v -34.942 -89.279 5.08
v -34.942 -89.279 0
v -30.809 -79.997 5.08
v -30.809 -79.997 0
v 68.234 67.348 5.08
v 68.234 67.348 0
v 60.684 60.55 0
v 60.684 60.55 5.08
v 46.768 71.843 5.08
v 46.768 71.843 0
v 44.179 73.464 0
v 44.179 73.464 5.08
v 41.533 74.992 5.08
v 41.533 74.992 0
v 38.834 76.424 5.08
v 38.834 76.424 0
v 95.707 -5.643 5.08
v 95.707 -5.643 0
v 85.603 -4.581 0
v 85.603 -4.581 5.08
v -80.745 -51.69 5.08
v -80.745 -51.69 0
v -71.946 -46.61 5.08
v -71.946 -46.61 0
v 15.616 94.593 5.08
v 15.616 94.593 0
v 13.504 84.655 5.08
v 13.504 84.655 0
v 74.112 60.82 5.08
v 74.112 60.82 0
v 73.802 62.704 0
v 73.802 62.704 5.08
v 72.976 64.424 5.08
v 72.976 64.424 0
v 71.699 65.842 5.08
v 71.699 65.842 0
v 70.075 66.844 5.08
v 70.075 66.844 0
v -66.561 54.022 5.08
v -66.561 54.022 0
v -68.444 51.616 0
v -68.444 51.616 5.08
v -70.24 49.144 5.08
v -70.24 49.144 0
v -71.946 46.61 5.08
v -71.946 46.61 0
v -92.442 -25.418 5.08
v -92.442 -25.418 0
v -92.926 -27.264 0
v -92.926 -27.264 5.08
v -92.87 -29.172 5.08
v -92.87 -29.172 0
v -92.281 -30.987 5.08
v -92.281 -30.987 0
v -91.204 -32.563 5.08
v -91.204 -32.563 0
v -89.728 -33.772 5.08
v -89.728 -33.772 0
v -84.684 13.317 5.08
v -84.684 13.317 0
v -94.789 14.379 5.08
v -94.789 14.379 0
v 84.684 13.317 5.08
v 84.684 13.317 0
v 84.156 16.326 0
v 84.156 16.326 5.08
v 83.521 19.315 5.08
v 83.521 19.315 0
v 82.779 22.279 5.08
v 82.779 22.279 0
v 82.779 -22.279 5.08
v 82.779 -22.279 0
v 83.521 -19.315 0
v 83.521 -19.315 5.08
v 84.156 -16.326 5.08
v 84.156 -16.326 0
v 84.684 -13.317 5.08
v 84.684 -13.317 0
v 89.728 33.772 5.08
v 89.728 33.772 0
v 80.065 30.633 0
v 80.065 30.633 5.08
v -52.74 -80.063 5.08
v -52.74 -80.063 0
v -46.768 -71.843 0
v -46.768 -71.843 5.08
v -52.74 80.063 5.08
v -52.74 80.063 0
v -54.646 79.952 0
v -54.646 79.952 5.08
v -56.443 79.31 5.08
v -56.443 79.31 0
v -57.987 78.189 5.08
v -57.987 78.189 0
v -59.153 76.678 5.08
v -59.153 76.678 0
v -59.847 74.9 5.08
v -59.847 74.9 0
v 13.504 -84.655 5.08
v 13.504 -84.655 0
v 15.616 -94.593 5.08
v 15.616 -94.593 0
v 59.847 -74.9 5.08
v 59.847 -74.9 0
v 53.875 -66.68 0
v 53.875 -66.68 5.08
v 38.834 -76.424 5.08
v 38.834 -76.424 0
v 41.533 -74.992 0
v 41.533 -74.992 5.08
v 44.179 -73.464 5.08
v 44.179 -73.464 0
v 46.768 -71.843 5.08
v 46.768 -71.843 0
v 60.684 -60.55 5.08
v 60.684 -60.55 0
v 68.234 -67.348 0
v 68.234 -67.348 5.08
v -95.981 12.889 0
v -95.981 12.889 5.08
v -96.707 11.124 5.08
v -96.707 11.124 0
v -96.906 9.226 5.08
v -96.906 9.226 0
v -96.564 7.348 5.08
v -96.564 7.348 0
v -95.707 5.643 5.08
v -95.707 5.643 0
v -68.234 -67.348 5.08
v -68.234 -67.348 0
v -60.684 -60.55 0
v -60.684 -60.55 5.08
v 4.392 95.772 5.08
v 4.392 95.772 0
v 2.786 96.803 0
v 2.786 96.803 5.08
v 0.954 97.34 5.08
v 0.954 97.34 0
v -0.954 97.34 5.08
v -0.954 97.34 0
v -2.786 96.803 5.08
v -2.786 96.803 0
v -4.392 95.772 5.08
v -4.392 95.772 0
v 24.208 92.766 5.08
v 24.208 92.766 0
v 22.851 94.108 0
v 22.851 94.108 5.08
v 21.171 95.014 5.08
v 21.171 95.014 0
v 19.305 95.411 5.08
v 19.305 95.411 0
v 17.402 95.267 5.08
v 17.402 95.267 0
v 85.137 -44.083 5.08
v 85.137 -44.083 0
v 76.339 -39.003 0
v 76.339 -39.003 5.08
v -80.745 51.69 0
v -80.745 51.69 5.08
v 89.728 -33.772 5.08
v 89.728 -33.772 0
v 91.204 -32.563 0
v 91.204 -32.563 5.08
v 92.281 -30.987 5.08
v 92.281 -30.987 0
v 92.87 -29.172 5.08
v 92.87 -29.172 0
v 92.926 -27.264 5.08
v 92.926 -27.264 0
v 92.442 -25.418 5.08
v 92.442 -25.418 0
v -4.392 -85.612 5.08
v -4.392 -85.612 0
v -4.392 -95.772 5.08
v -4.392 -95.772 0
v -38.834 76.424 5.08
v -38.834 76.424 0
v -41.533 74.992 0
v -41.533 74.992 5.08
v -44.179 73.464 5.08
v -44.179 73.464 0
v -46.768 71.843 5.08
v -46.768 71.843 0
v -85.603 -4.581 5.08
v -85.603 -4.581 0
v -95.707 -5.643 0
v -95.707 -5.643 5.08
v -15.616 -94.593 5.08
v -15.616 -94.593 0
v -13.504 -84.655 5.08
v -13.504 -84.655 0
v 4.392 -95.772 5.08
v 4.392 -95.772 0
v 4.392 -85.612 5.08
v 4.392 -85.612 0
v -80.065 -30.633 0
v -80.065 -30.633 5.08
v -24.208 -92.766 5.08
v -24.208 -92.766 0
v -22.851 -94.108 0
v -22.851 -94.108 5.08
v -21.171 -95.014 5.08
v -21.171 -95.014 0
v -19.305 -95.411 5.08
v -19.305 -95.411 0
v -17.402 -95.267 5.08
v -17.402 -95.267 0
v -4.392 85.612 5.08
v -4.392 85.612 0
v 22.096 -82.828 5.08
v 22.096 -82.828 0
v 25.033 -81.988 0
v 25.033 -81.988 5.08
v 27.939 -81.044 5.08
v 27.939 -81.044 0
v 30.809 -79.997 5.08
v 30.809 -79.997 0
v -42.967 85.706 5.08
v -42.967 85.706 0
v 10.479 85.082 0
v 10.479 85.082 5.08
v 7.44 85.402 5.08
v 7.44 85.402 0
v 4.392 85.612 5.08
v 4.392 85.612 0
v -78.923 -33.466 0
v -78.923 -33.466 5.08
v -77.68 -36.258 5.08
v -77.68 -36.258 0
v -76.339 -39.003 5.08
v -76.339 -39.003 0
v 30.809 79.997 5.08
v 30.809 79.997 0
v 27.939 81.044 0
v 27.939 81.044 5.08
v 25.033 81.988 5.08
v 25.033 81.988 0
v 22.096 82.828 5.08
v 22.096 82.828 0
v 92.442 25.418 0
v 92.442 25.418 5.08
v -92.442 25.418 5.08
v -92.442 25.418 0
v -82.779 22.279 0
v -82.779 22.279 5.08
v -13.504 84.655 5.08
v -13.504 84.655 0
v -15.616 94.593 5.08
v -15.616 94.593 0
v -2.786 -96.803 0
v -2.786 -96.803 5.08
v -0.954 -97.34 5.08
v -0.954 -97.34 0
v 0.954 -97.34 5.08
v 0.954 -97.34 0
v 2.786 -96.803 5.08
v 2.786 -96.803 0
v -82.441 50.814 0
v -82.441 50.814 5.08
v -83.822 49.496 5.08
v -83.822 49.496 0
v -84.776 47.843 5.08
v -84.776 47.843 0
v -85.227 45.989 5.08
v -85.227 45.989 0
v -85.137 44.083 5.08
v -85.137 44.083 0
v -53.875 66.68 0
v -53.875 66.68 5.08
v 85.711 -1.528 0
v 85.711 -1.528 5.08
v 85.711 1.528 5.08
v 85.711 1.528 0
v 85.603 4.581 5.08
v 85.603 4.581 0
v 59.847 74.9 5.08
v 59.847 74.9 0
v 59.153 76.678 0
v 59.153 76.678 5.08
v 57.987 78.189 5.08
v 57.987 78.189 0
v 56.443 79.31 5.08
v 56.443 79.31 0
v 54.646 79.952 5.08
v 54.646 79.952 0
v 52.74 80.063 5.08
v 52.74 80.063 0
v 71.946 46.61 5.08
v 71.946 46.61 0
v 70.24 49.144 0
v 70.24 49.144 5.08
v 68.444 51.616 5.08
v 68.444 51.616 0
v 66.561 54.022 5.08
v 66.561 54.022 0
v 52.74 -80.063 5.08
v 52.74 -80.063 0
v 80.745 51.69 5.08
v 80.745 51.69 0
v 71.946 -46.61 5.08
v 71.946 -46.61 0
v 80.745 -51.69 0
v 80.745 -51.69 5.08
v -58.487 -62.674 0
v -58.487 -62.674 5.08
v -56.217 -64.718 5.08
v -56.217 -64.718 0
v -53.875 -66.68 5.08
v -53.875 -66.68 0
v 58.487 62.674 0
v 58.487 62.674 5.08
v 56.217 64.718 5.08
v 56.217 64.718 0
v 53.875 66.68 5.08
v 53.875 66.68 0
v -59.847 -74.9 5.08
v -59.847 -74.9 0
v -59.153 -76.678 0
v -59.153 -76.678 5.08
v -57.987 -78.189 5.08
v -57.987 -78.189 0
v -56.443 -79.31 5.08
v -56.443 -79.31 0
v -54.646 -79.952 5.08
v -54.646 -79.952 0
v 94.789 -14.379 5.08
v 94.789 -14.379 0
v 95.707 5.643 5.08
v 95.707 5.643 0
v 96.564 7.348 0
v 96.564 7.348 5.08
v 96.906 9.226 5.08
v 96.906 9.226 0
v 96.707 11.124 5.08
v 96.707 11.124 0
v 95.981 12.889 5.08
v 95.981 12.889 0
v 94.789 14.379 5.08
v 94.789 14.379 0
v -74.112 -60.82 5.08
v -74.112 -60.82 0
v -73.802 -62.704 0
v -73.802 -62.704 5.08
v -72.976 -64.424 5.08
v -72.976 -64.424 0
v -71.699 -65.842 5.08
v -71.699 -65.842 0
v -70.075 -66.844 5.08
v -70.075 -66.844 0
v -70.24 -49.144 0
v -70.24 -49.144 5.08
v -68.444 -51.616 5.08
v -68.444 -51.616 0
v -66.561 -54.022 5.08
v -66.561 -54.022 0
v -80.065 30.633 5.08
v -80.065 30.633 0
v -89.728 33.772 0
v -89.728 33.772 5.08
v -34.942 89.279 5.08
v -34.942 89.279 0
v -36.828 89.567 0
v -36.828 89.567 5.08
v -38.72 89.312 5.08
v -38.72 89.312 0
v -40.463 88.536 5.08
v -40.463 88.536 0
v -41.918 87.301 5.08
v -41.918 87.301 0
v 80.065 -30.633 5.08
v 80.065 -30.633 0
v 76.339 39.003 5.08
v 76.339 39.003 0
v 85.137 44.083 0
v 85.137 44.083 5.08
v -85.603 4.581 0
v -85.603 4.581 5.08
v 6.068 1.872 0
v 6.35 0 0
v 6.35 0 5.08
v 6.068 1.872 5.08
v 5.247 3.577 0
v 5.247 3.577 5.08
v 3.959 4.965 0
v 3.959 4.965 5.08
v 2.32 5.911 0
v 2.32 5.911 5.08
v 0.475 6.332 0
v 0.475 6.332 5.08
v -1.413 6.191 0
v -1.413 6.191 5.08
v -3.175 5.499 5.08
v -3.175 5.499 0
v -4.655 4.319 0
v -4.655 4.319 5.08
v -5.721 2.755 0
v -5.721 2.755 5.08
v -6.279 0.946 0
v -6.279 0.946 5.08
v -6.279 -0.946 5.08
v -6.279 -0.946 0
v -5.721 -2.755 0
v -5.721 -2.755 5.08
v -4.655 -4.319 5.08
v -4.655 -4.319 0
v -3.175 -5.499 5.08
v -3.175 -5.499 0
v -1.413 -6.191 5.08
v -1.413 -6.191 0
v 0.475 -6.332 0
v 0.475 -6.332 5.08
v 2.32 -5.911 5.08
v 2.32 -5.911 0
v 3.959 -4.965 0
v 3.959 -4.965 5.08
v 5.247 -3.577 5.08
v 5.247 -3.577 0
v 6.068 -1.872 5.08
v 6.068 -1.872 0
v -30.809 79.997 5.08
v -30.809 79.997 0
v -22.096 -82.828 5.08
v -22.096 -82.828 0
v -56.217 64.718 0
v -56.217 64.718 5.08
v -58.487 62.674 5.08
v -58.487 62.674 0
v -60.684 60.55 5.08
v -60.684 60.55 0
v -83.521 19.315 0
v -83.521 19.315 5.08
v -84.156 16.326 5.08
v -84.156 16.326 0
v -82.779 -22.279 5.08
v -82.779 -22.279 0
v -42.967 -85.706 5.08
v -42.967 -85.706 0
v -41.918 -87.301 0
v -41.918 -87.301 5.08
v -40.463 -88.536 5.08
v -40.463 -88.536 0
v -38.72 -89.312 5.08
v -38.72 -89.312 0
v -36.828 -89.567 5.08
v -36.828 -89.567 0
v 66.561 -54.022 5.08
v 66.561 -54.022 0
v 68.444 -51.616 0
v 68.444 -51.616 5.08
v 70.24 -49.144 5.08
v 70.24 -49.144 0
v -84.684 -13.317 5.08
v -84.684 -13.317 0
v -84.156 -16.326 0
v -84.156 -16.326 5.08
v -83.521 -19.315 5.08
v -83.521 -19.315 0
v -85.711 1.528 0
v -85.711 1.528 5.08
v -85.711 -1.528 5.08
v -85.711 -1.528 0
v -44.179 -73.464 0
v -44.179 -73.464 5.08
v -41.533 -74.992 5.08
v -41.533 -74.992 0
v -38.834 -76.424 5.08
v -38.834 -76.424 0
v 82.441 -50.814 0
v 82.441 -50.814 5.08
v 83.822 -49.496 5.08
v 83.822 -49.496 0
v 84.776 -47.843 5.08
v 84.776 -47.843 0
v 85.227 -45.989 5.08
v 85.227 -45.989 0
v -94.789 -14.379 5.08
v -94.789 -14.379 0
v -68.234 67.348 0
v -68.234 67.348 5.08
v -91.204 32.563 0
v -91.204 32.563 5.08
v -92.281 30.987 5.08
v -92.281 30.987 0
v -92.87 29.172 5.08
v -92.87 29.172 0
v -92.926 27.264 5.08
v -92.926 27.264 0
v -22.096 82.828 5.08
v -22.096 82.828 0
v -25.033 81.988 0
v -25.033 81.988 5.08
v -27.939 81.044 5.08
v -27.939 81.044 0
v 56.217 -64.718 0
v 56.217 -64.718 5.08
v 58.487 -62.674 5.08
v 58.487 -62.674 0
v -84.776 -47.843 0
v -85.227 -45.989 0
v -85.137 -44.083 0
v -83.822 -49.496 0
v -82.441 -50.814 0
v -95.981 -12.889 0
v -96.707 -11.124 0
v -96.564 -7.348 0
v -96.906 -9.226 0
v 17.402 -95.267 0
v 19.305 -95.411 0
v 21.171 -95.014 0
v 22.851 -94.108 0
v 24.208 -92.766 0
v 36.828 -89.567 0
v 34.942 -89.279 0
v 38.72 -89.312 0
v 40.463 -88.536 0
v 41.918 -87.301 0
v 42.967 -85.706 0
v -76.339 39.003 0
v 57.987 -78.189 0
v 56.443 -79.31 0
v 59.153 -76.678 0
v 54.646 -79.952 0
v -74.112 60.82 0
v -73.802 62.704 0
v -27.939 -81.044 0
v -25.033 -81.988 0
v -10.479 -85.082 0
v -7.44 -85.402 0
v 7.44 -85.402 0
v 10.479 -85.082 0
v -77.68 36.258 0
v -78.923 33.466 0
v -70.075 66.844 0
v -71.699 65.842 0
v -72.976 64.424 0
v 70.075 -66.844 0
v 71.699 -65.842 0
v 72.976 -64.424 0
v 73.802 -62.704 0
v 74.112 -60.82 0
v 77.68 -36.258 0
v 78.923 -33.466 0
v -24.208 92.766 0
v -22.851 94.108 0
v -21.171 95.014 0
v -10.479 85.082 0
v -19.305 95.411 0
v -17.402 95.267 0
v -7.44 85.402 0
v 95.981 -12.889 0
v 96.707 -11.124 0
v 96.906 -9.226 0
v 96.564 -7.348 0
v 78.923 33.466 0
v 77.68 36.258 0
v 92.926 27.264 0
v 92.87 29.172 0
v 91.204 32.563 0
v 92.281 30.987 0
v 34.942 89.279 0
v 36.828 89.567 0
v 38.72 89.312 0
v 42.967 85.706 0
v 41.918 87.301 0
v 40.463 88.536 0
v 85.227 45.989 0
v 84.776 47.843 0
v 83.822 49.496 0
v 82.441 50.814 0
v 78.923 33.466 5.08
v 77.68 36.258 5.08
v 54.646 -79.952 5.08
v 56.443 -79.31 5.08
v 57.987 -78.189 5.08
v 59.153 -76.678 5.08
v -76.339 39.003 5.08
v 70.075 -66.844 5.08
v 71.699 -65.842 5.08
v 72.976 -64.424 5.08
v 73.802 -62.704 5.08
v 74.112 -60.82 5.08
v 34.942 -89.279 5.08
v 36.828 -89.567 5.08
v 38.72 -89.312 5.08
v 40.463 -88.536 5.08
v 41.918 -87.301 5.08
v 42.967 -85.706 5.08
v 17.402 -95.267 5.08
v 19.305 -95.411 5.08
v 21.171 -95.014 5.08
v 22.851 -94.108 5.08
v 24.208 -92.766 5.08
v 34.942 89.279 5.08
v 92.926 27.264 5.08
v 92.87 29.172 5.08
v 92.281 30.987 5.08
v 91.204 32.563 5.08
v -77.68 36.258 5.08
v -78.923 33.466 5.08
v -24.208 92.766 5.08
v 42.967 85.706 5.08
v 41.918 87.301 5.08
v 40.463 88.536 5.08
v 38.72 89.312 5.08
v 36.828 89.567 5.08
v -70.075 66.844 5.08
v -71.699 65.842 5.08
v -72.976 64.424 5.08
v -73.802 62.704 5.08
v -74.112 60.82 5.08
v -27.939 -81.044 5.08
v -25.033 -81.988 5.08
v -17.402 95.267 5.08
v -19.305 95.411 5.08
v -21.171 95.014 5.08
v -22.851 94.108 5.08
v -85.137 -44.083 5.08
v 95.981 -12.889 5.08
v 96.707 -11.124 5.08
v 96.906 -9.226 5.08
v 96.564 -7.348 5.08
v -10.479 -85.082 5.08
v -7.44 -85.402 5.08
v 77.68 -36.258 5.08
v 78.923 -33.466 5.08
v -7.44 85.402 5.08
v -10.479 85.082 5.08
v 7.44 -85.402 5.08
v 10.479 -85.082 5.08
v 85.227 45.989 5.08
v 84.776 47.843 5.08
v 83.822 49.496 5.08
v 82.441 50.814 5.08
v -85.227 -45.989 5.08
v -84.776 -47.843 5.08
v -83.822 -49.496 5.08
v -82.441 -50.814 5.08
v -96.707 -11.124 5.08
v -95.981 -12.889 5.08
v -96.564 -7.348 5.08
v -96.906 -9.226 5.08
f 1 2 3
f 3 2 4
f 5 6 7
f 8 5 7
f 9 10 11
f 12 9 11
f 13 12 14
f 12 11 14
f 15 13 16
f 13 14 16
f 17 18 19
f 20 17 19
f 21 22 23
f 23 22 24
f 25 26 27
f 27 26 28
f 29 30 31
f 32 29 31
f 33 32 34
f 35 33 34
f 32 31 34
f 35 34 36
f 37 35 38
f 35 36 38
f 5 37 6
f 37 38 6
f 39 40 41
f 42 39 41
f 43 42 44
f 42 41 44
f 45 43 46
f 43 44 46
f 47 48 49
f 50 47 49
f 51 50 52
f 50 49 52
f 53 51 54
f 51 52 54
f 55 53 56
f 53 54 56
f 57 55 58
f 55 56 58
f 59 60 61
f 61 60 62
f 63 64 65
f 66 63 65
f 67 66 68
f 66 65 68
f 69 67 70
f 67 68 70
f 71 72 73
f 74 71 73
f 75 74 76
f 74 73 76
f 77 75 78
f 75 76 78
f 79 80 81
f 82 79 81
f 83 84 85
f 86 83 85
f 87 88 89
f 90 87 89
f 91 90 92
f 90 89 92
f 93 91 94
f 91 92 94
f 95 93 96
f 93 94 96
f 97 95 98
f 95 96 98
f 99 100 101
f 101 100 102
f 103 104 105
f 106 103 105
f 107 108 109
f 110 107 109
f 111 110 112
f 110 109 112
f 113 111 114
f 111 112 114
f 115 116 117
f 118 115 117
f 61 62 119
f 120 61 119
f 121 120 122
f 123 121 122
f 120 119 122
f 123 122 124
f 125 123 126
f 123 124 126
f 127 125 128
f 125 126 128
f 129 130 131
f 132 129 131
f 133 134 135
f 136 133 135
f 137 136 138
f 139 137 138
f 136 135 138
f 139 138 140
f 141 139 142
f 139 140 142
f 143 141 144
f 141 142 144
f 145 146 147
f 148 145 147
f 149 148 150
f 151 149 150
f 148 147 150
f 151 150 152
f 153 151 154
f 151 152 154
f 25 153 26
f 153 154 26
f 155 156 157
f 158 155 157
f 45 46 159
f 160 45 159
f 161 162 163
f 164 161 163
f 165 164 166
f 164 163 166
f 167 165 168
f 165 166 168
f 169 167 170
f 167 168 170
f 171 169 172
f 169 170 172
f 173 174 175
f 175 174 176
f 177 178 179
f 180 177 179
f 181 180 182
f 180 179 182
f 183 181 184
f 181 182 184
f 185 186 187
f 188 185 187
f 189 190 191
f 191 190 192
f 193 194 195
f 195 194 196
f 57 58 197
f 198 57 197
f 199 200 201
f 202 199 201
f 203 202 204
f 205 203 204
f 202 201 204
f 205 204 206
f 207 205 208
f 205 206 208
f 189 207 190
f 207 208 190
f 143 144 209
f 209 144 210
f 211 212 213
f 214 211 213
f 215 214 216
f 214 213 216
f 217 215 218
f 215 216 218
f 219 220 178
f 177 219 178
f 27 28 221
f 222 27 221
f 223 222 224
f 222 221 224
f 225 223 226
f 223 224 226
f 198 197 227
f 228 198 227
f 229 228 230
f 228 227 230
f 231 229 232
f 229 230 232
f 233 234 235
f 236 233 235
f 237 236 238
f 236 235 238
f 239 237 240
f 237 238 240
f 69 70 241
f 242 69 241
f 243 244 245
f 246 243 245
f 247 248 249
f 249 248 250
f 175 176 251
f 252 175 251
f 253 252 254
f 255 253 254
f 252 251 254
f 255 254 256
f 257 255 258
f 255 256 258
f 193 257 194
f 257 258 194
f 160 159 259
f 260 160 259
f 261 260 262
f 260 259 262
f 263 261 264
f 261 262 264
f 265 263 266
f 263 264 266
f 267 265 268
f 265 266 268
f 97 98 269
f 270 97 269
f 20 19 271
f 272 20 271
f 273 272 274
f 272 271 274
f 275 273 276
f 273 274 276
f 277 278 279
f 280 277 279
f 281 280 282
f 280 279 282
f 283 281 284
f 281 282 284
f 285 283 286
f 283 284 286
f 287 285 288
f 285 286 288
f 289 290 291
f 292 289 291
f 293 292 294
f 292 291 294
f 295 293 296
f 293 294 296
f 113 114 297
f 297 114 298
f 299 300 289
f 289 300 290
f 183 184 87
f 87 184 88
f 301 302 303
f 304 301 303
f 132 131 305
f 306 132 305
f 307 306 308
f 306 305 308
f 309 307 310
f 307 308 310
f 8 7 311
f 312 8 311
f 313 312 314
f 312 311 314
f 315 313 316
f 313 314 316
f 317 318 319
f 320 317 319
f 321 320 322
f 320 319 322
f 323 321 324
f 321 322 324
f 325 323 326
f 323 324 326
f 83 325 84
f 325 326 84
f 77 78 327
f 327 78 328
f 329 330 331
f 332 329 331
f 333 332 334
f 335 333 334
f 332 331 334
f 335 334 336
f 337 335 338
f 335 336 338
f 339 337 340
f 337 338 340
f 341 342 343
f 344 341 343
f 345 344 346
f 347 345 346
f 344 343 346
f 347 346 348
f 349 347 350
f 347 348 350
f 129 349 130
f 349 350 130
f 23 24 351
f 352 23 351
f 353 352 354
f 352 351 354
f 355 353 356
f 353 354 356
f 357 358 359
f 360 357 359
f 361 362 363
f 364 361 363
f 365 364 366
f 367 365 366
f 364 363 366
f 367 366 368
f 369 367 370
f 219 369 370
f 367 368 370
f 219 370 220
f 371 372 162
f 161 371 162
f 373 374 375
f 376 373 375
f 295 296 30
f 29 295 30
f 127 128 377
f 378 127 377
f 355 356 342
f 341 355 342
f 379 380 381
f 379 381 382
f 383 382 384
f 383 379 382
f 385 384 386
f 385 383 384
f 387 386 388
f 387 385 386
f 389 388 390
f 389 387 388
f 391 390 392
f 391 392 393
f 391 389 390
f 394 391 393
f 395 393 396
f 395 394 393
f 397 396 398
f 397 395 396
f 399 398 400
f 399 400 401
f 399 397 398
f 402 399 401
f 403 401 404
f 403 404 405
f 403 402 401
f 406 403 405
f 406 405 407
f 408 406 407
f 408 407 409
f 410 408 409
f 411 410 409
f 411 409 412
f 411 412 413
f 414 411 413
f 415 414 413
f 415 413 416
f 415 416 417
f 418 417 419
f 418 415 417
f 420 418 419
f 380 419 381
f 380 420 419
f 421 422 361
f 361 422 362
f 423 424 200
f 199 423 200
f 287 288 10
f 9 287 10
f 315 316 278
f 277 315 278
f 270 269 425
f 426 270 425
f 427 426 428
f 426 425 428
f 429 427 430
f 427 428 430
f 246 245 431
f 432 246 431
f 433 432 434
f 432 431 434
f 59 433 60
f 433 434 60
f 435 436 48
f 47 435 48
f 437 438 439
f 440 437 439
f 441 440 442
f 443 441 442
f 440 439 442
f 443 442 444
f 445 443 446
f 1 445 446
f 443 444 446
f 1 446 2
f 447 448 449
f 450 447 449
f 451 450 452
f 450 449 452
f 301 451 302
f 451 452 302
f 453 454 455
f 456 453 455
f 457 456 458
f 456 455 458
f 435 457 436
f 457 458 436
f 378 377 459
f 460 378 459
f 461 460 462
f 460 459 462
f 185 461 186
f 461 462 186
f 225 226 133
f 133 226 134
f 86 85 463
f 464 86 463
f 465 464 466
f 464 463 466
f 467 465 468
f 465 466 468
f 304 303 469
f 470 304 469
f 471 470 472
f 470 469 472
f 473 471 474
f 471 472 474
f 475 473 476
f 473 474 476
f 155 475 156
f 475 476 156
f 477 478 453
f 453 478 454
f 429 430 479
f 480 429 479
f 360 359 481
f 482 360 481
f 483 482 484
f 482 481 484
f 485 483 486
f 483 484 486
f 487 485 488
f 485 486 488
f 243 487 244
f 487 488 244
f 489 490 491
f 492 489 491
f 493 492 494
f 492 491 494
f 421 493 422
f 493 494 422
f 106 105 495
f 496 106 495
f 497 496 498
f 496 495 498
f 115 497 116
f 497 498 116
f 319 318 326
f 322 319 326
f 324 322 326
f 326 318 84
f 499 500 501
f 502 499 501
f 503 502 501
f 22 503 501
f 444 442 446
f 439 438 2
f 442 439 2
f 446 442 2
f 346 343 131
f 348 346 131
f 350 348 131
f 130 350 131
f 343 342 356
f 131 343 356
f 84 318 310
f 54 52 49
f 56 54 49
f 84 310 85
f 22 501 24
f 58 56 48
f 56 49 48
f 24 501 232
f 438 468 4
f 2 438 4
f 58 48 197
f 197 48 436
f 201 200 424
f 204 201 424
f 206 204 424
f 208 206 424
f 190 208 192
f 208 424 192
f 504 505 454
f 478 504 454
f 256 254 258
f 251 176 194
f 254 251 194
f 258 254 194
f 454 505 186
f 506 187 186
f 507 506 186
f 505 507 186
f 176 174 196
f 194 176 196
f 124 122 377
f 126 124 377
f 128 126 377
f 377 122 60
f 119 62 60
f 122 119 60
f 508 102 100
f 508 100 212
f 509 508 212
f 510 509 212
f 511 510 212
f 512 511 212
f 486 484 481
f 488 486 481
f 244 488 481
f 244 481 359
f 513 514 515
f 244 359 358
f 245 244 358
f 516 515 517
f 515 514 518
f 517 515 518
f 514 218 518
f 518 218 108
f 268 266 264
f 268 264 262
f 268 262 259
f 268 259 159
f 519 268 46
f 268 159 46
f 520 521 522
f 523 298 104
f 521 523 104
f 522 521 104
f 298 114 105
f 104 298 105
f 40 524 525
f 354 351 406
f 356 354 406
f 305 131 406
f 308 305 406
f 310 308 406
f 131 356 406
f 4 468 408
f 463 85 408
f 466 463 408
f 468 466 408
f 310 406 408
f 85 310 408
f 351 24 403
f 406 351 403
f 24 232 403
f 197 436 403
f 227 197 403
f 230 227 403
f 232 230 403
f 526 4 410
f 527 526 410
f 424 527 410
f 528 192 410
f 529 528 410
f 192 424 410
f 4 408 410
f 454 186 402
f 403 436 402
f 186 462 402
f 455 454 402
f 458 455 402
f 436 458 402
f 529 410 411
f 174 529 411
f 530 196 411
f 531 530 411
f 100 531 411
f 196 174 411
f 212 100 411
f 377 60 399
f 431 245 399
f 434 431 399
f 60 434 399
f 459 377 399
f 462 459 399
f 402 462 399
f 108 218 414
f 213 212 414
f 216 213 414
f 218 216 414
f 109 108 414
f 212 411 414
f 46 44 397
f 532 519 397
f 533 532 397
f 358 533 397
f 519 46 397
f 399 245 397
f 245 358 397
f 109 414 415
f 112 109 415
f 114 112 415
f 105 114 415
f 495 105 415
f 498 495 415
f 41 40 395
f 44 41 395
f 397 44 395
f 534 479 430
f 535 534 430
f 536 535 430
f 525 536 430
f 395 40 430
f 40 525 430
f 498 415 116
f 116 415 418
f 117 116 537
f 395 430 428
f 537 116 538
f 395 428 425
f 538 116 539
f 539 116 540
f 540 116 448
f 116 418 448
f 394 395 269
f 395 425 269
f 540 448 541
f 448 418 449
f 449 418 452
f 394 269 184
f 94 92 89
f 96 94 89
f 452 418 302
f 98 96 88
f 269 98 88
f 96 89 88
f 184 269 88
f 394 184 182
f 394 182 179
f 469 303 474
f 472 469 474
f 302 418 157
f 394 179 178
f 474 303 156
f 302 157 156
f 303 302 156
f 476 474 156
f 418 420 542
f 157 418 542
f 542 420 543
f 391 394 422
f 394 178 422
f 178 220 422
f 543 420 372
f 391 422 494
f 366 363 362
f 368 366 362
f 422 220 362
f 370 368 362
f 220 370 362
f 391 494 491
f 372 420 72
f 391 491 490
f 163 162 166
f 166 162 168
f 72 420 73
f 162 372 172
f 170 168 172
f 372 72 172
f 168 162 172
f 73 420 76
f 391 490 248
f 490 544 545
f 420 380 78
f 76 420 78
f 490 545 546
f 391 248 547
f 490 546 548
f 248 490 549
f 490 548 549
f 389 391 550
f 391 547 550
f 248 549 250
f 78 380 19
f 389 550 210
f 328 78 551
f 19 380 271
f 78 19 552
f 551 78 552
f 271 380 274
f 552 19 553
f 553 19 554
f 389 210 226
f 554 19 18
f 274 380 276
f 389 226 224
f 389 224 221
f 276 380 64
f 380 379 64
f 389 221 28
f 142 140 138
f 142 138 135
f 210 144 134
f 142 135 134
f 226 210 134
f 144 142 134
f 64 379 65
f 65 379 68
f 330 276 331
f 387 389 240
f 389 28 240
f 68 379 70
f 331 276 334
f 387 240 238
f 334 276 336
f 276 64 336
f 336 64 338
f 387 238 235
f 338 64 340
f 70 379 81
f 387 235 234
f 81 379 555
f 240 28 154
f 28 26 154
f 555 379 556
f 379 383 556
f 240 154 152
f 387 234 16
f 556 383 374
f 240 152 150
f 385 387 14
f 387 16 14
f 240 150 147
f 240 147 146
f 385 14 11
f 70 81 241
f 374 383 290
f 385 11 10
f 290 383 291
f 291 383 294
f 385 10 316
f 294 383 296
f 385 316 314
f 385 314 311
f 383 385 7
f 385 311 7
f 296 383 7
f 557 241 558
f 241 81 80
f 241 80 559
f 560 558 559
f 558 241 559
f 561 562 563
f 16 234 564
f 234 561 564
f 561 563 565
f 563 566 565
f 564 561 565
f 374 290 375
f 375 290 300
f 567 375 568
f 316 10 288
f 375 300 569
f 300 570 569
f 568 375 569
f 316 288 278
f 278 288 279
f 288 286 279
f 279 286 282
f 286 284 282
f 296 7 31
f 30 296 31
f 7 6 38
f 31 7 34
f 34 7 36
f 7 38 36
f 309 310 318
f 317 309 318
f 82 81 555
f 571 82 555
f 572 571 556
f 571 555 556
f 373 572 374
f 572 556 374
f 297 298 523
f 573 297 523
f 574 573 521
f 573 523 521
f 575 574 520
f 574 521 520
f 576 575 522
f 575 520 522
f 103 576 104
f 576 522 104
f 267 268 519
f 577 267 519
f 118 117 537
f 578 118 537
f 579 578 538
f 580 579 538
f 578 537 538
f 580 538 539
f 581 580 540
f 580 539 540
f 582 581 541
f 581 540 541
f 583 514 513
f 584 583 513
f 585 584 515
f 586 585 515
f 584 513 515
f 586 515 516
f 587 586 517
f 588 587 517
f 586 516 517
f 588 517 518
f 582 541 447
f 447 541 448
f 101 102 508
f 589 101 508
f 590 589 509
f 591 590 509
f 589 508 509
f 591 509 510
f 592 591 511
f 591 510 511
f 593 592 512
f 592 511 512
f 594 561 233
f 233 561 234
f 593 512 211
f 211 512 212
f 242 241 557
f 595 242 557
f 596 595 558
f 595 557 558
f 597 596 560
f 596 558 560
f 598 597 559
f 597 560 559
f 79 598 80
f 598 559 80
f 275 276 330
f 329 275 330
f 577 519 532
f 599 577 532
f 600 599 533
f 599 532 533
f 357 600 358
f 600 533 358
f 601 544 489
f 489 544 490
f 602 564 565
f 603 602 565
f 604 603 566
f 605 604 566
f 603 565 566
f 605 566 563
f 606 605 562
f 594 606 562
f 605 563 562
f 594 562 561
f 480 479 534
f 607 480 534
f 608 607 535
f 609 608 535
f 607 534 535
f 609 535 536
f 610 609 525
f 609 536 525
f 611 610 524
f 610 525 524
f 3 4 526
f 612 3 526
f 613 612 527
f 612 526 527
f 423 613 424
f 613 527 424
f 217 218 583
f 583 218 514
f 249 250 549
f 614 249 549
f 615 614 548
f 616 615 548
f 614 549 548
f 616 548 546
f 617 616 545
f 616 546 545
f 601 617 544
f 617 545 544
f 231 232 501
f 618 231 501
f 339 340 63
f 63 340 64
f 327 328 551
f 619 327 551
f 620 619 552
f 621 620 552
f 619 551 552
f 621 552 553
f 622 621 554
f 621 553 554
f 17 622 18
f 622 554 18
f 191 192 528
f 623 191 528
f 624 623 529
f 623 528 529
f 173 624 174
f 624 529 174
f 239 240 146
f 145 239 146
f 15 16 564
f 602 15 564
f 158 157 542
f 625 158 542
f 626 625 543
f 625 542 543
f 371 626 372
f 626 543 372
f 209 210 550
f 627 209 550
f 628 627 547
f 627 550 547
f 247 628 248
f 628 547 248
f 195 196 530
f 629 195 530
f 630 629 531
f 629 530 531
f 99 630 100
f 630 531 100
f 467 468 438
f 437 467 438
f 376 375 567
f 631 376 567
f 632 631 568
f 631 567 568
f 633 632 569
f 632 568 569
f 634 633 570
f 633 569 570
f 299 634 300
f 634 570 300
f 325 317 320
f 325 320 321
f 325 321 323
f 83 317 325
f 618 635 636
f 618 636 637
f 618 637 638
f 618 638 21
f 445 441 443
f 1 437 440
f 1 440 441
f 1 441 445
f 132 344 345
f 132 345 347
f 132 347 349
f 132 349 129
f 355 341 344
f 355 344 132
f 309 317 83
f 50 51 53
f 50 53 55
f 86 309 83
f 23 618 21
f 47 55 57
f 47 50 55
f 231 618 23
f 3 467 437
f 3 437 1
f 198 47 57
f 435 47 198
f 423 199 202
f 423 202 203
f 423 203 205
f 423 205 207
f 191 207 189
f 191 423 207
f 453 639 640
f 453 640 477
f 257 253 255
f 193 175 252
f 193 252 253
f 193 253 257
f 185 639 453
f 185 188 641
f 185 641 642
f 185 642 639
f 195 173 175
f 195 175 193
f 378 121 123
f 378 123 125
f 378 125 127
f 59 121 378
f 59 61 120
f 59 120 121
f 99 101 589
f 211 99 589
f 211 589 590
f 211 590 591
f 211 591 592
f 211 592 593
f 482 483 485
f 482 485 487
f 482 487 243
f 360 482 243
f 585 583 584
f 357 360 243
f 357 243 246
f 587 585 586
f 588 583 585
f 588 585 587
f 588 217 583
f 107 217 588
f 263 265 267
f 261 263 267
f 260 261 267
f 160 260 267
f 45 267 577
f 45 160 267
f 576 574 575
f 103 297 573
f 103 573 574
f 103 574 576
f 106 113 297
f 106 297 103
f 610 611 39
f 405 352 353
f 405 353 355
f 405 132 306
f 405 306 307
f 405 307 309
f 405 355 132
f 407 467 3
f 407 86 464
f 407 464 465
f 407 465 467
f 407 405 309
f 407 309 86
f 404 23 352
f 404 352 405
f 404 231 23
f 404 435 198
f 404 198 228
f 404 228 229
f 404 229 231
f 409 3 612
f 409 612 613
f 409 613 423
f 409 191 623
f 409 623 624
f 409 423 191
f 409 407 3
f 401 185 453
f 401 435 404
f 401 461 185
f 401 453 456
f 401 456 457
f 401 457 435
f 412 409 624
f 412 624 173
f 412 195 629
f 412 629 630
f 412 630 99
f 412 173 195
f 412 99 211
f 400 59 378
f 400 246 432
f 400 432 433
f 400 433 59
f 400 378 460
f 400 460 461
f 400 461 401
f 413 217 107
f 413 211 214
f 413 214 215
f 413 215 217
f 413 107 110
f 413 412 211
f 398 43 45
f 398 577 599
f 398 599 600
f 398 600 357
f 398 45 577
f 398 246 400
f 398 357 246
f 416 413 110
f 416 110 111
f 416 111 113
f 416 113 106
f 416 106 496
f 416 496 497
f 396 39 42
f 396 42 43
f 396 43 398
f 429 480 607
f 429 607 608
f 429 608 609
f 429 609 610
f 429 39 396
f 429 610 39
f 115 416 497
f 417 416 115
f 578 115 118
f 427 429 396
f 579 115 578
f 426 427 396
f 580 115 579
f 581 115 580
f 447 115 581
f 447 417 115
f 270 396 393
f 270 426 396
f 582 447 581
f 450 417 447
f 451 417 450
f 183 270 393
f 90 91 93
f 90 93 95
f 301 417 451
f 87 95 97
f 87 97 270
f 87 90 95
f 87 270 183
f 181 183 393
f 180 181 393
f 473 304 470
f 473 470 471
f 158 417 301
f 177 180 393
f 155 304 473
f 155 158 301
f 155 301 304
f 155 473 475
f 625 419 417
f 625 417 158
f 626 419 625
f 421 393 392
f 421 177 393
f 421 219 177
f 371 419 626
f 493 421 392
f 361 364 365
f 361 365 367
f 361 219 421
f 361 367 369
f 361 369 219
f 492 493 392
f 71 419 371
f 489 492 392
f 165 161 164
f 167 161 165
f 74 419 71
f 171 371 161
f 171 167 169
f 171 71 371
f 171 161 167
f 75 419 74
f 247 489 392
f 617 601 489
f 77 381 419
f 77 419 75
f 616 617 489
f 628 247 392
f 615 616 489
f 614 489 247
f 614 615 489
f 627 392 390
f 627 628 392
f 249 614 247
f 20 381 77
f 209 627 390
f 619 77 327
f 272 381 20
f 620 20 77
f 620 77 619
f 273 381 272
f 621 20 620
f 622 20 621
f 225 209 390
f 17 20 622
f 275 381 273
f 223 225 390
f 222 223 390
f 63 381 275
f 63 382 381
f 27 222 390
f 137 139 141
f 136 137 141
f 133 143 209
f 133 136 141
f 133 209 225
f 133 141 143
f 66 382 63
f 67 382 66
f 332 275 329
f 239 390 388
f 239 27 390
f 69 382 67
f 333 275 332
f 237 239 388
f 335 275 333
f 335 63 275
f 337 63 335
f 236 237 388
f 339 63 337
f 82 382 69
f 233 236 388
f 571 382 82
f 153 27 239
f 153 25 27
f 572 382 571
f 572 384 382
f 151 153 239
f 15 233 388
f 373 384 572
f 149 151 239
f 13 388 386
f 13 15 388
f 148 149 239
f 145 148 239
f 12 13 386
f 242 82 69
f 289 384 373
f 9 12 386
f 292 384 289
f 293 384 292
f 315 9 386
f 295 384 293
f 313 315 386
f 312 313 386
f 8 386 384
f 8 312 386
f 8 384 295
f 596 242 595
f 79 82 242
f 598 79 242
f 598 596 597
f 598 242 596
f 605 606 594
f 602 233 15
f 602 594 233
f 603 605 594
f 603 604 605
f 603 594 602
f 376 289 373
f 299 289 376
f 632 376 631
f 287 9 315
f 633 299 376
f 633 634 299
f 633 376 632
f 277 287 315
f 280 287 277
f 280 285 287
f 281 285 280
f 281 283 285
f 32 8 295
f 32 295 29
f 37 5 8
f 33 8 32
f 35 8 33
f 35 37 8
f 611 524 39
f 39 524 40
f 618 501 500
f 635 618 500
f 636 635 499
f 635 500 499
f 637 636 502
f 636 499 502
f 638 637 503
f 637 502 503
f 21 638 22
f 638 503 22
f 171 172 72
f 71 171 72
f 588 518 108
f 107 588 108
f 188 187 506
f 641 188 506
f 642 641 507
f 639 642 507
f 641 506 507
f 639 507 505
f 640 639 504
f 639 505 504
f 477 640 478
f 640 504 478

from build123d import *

# Parameters (mm, degrees)
F0_R     = 6.35
F1_DEPTH = 5.08


with BuildPart() as f1:
    # F0 (on Top) → F1 (new body)
    with BuildSketch(Plane.XY):
        with BuildLine():
            Line((-4.392071, 95.772413), (-4.392071, 85.612413))
            ThreePointArc((-4.392071, 85.612413), (-8.960703, 85.255389), (-13.503728, 84.65474))
            Line((-13.503728, 84.65474), (-15.616111, 94.592719))
            ThreePointArc((-15.616111, 94.592719), (-20.252225, 95.279225), (-24.208298, 92.766394))
            Line((-24.208298, 92.766394), (-22.095915, 82.828414))
            ThreePointArc((-22.095915, 82.828414), (-26.490482, 81.52932), (-30.80935, 79.997247))
            Line((-30.80935, 79.997247), (-34.941794, 89.278869))
            ThreePointArc((-34.941794, 89.278869), (-39.61933, 88.986471), (-42.966506, 85.706037))
            Line((-42.966506, 85.706037), (-38.834062, 76.424415))
            ThreePointArc((-38.834062, 76.424415), (-42.8625, 74.240028), (-46.768454, 71.843492))
            Line((-46.768454, 71.843492), (-52.740352, 80.063104))
            ThreePointArc((-52.740352, 80.063104), (-57.25488, 78.804582), (-59.846872, 74.899916))
            Line((-59.846872, 74.899916), (-53.874974, 66.680303))
            ThreePointArc((-53.874974, 66.680303), (-57.361221, 63.70609), (-60.683553, 60.549831))
            Line((-60.683553, 60.549831), (-68.233905, 67.348198))
            ThreePointArc((-68.233905, 67.348198), (-72.388117, 65.178554), (-74.111642, 60.820309))
            Line((-74.111642, 60.820309), (-66.561291, 54.021942))
            ThreePointArc((-66.561291, 54.021942), (-69.352982, 50.387891), (-71.94649, 46.609851))
            Line((-71.94649, 46.609851), (-80.745308, 51.689851))
            ThreePointArc((-80.745308, 51.689851), (-84.357647, 48.70391), (-85.137378, 44.082562))
            Line((-85.137378, 44.082562), (-76.33856, 39.002562))
            ThreePointArc((-76.33856, 39.002562), (-78.313684, 34.867499), (-80.065019, 30.632798))
            Line((-80.065019, 30.632798), (-89.727753, 33.772411))
            ThreePointArc((-89.727753, 33.772411), (-92.640342, 30.100672), (-92.442202, 25.418196))
            Line((-92.442202, 25.418196), (-82.779468, 22.278583))
            ThreePointArc((-82.779468, 22.278583), (-83.851703, 17.82323), (-84.684323, 13.316944))
            Line((-84.684323, 13.316944), (-94.788666, 14.378954))
            ThreePointArc((-94.788666, 14.378954), (-96.87421, 10.18189), (-95.706859, 5.642933))
            Line((-95.706859, 5.642933), (-85.602516, 4.580924))
            ThreePointArc((-85.602516, 4.580924), (-85.725, 0), (-85.602516, -4.580924))
            Line((-85.602516, -4.580924), (-95.706859, -5.642933))
            ThreePointArc((-95.706859, -5.642933), (-96.87421, -10.18189), (-94.788666, -14.378954))
            Line((-94.788666, -14.378954), (-84.684323, -13.316944))
            ThreePointArc((-84.684323, -13.316944), (-83.851703, -17.82323), (-82.779468, -22.278583))
            Line((-82.779468, -22.278583), (-92.442202, -25.418196))
            ThreePointArc((-92.442202, -25.418196), (-92.640342, -30.100672), (-89.727753, -33.772411))
            Line((-89.727753, -33.772411), (-80.065019, -30.632798))
            ThreePointArc((-80.065019, -30.632798), (-78.313684, -34.867499), (-76.33856, -39.002562))
            Line((-76.33856, -39.002562), (-85.137378, -44.082562))
            ThreePointArc((-85.137378, -44.082562), (-84.357647, -48.70391), (-80.745308, -51.689851))
            Line((-80.745308, -51.689851), (-71.94649, -46.609851))
            ThreePointArc((-71.94649, -46.609851), (-69.352982, -50.387891), (-66.561291, -54.021942))
            Line((-66.561291, -54.021942), (-74.111642, -60.820309))
            ThreePointArc((-74.111642, -60.820309), (-72.388117, -65.178554), (-68.233905, -67.348198))
            Line((-68.233905, -67.348198), (-60.683553, -60.549831))
            ThreePointArc((-60.683553, -60.549831), (-57.361221, -63.70609), (-53.874974, -66.680303))
            Line((-53.874974, -66.680303), (-59.846872, -74.899916))
            ThreePointArc((-59.846872, -74.899916), (-57.25488, -78.804582), (-52.740352, -80.063104))
            Line((-52.740352, -80.063104), (-46.768454, -71.843492))
            ThreePointArc((-46.768454, -71.843492), (-42.8625, -74.240028), (-38.834062, -76.424415))
            Line((-38.834062, -76.424415), (-42.966506, -85.706037))
            ThreePointArc((-42.966506, -85.706037), (-39.61933, -88.986471), (-34.941794, -89.278869))
            Line((-34.941794, -89.278869), (-30.80935, -79.997247))
            ThreePointArc((-30.80935, -79.997247), (-26.490482, -81.52932), (-22.095915, -82.828414))
            Line((-22.095915, -82.828414), (-24.208298, -92.766394))
            ThreePointArc((-24.208298, -92.766394), (-20.252225, -95.279225), (-15.616111, -94.592719))
            Line((-15.616111, -94.592719), (-13.503728, -84.65474))
            ThreePointArc((-13.503728, -84.65474), (-8.960703, -85.255389), (-4.392071, -85.612413))
            Line((-4.392071, -85.612413), (-4.392071, -95.772413))
            ThreePointArc((-4.392071, -95.772413), (0, -97.40782), (4.392071, -95.772413))
            Line((4.392071, -95.772413), (4.392071, -85.612413))
            ThreePointArc((4.392071, -85.612413), (8.960703, -85.255389), (13.503728, -84.65474))
            Line((13.503728, -84.65474), (15.616111, -94.592719))
            ThreePointArc((15.616111, -94.592719), (20.252225, -95.279225), (24.208298, -92.766394))
            Line((24.208298, -92.766394), (22.095915, -82.828414))
            ThreePointArc((22.095915, -82.828414), (26.490482, -81.52932), (30.80935, -79.997247))
            Line((30.80935, -79.997247), (34.941794, -89.278869))
            ThreePointArc((34.941794, -89.278869), (39.61933, -88.986471), (42.966506, -85.706037))
            Line((42.966506, -85.706037), (38.834062, -76.424415))
            ThreePointArc((38.834062, -76.424415), (42.8625, -74.240028), (46.768454, -71.843492))
            Line((46.768454, -71.843492), (52.740352, -80.063104))
            ThreePointArc((52.740352, -80.063104), (57.25488, -78.804582), (59.846872, -74.899916))
            Line((59.846872, -74.899916), (53.874974, -66.680303))
            ThreePointArc((53.874974, -66.680303), (57.361221, -63.70609), (60.683553, -60.549831))
            Line((60.683553, -60.549831), (68.233905, -67.348198))
            ThreePointArc((68.233905, -67.348198), (72.388117, -65.178554), (74.111642, -60.820309))
            Line((74.111642, -60.820309), (66.561291, -54.021942))
            ThreePointArc((66.561291, -54.021942), (69.352982, -50.387891), (71.94649, -46.609851))
            Line((71.94649, -46.609851), (80.745308, -51.689851))
            ThreePointArc((80.745308, -51.689851), (84.357647, -48.70391), (85.137378, -44.082562))
            Line((85.137378, -44.082562), (76.33856, -39.002562))
            ThreePointArc((76.33856, -39.002562), (78.313684, -34.867499), (80.065019, -30.632798))
            Line((80.065019, -30.632798), (89.727753, -33.772411))
            ThreePointArc((89.727753, -33.772411), (92.640342, -30.100672), (92.442202, -25.418196))
            Line((92.442202, -25.418196), (82.779468, -22.278583))
            ThreePointArc((82.779468, -22.278583), (83.851703, -17.82323), (84.684323, -13.316944))
            Line((84.684323, -13.316944), (94.788666, -14.378954))
            ThreePointArc((94.788666, -14.378954), (96.87421, -10.18189), (95.706859, -5.642933))
            Line((95.706859, -5.642933), (85.602516, -4.580924))
            ThreePointArc((85.602516, -4.580924), (85.725, 0), (85.602516, 4.580924))
            Line((85.602516, 4.580924), (95.706859, 5.642933))
            ThreePointArc((95.706859, 5.642933), (96.87421, 10.18189), (94.788666, 14.378954))
            Line((94.788666, 14.378954), (84.684323, 13.316944))
            ThreePointArc((84.684323, 13.316944), (83.851703, 17.82323), (82.779468, 22.278583))
            Line((82.779468, 22.278583), (92.442202, 25.418196))
            ThreePointArc((92.442202, 25.418196), (92.640342, 30.100672), (89.727753, 33.772411))
            Line((89.727753, 33.772411), (80.065019, 30.632798))
            ThreePointArc((80.065019, 30.632798), (78.313684, 34.867499), (76.33856, 39.002562))
            Line((76.33856, 39.002562), (85.137378, 44.082562))
            ThreePointArc((85.137378, 44.082562), (84.357647, 48.70391), (80.745308, 51.689851))
            Line((80.745308, 51.689851), (71.94649, 46.609851))
            ThreePointArc((71.94649, 46.609851), (69.352982, 50.387891), (66.561291, 54.021942))
            Line((66.561291, 54.021942), (74.111642, 60.820309))
            ThreePointArc((74.111642, 60.820309), (72.388117, 65.178554), (68.233905, 67.348198))
            Line((68.233905, 67.348198), (60.683553, 60.549831))
            ThreePointArc((60.683553, 60.549831), (57.361221, 63.70609), (53.874974, 66.680303))
            Line((53.874974, 66.680303), (59.846872, 74.899916))
            ThreePointArc((59.846872, 74.899916), (57.25488, 78.804582), (52.740352, 80.063104))
            Line((52.740352, 80.063104), (46.768454, 71.843492))
            ThreePointArc((46.768454, 71.843492), (42.8625, 74.240028), (38.834062, 76.424415))
            Line((38.834062, 76.424415), (42.966506, 85.706037))
            ThreePointArc((42.966506, 85.706037), (39.61933, 88.986471), (34.941794, 89.278869))
            Line((34.941794, 89.278869), (30.80935, 79.997247))
            ThreePointArc((30.80935, 79.997247), (26.490482, 81.52932), (22.095915, 82.828414))
            Line((22.095915, 82.828414), (24.208298, 92.766394))
            ThreePointArc((24.208298, 92.766394), (20.252225, 95.279225), (15.616111, 94.592719))
            Line((15.616111, 94.592719), (13.503728, 84.65474))
            ThreePointArc((13.503728, 84.65474), (8.960703, 85.255389), (4.392071, 85.612413))
            Line((4.392071, 85.612413), (4.392071, 95.772413))
            ThreePointArc((4.392071, 95.772413), (0, 97.40782), (-4.392071, 95.772413))
        make_face()
        Circle(F0_R, mode=Mode.SUBTRACT)
    extrude(amount=F1_DEPTH)


solid = f1.part
